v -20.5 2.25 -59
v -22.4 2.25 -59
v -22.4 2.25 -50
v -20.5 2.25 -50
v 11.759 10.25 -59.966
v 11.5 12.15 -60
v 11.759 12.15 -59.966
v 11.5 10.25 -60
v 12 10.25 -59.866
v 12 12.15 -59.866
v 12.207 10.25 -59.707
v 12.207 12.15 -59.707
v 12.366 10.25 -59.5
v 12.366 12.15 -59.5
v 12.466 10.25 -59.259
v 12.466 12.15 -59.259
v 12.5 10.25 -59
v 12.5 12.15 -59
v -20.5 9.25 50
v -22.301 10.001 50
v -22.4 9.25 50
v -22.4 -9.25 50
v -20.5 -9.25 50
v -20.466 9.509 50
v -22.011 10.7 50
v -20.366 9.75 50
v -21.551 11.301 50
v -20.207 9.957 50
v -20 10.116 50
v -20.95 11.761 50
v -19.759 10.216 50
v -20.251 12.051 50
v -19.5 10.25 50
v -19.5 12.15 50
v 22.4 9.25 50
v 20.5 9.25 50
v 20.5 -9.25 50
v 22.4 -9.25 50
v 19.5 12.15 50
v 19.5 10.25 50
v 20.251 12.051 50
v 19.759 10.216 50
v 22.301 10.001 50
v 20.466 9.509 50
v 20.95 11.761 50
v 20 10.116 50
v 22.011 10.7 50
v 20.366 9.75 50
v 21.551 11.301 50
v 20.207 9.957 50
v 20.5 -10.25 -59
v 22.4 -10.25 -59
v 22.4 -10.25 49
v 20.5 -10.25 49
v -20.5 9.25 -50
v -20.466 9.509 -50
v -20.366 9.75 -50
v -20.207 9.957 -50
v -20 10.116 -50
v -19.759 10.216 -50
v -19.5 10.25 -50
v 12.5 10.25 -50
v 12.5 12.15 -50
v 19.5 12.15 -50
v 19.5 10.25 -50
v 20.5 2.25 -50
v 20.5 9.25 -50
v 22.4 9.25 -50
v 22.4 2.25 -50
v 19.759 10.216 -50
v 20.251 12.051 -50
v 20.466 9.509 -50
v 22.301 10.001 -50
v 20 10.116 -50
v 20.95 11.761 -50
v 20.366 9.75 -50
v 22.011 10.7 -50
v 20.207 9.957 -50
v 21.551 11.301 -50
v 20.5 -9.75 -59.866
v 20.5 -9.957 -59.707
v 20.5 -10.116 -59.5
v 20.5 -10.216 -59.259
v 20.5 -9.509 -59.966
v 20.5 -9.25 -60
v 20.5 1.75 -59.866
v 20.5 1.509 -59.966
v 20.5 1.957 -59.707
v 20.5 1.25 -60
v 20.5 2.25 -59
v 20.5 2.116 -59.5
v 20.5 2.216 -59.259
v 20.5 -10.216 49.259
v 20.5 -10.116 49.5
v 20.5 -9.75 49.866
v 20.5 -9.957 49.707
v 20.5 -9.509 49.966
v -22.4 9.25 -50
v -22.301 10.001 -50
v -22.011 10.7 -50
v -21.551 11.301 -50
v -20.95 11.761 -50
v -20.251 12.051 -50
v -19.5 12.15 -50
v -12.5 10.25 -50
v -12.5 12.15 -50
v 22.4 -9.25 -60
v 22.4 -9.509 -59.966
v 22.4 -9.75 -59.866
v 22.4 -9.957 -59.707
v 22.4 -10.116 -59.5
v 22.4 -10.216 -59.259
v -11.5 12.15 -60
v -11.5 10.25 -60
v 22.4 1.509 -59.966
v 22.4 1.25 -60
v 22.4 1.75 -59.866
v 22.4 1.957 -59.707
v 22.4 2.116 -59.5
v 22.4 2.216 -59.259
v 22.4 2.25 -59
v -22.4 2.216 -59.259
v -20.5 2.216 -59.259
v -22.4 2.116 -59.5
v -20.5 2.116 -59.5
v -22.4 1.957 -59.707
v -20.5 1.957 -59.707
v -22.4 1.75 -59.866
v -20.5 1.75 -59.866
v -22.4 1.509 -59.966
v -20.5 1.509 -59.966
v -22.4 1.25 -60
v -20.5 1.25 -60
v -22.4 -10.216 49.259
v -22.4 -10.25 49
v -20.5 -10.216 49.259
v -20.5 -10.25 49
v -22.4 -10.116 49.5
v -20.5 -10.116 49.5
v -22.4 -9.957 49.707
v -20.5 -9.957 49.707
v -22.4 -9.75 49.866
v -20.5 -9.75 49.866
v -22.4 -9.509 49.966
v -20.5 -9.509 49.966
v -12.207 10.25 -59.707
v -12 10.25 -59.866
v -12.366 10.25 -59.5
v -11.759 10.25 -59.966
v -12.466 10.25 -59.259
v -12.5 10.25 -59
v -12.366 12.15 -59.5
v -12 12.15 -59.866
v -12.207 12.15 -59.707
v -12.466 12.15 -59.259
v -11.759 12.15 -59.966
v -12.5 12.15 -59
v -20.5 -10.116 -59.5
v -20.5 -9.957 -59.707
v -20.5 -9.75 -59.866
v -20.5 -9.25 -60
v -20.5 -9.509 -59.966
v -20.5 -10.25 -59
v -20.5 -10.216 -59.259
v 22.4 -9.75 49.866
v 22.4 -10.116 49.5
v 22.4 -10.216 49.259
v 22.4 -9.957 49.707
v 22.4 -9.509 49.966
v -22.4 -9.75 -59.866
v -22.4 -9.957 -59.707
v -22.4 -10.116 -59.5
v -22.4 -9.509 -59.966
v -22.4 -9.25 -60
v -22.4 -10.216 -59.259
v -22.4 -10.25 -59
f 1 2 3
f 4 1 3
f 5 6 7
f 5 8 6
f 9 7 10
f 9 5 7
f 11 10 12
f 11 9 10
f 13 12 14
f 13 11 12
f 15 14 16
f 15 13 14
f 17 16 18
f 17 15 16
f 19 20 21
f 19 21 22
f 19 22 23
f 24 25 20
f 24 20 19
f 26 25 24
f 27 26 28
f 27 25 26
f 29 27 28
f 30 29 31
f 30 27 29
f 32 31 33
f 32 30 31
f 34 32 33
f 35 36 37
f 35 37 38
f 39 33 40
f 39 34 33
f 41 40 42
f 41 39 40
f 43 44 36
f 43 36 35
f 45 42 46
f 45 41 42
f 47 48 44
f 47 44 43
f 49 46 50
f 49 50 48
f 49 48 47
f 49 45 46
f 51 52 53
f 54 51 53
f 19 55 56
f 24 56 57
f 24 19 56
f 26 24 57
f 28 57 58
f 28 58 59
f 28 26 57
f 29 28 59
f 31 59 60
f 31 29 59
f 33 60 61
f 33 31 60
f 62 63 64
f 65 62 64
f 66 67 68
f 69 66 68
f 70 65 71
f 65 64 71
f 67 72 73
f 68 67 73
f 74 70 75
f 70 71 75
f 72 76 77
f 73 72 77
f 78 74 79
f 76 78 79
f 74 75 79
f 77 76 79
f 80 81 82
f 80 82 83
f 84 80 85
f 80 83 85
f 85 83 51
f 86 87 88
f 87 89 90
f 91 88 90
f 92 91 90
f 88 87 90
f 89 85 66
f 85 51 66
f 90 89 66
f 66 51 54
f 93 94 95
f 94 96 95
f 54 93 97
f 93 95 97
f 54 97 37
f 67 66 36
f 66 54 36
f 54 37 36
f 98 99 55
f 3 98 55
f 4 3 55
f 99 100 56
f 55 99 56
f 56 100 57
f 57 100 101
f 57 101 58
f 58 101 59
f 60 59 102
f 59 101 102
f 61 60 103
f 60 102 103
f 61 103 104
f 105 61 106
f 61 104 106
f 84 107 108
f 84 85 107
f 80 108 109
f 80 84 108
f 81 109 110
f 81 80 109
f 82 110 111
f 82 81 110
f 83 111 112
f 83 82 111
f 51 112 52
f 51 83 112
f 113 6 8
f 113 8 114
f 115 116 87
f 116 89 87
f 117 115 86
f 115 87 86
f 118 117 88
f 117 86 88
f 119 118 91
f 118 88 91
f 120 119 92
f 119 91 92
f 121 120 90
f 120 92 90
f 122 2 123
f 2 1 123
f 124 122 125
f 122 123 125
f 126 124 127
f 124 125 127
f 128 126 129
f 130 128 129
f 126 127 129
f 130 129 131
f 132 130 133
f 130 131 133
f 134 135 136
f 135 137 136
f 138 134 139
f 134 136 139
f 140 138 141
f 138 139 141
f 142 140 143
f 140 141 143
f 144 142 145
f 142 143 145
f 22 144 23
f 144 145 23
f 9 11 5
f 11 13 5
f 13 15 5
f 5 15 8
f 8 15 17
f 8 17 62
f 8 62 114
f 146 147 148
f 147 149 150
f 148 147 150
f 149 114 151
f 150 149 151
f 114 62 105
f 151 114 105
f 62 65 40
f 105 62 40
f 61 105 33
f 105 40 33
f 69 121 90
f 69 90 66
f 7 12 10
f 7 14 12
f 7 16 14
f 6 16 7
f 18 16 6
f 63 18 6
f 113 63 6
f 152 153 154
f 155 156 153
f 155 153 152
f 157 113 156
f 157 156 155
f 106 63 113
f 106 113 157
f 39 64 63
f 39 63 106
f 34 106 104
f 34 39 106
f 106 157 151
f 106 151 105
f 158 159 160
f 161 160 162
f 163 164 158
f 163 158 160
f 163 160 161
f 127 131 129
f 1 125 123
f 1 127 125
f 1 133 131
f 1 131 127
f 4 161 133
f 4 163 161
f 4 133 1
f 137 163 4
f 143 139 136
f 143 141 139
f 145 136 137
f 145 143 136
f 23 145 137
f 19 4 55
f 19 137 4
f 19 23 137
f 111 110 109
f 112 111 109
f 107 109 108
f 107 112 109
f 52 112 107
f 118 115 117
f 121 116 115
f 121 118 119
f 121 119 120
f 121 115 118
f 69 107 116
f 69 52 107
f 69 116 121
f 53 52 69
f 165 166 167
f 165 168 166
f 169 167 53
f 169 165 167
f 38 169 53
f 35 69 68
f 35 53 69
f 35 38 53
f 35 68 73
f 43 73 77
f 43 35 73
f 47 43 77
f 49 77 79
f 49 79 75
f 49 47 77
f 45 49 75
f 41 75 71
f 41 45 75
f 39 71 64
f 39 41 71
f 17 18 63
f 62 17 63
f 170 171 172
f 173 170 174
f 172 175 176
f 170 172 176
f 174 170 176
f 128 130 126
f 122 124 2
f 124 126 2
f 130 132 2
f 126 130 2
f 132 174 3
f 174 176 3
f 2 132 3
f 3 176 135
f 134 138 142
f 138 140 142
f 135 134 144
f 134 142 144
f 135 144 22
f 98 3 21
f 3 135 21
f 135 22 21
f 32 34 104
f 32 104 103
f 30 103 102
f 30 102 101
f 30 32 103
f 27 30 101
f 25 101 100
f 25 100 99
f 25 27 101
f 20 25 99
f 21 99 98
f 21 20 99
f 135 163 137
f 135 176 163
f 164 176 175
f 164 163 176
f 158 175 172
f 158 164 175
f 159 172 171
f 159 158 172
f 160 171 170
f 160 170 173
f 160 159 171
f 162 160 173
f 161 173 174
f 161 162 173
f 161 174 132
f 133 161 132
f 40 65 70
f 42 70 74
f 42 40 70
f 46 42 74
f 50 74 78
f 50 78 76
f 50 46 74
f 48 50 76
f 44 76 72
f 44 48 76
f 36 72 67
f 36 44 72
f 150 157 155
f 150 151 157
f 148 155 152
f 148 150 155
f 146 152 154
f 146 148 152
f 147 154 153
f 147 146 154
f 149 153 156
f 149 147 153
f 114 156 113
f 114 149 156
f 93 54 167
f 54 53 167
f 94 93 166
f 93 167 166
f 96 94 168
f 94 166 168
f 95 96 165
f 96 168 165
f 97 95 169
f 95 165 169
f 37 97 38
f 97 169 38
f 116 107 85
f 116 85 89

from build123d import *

# Parameters (mm, degrees)
F1_DEPTH = 50
F2_W     = 25
F2_H     = 20
F3_DEPTH = 1.9
F4_W     = 12.5
F4_H     = 10
F5_DEPTH = 1.9
F7_R     = 1


with BuildPart() as f1:
    # F0 (on Top) → F1 (new body, symmetric)
    with BuildSketch(Plane.XY):
        with BuildLine():
            Line((-19.5, 10.25), (19.5, 10.25))
            ThreePointArc((19.5, 10.25), (20.2071067812, 9.9571067812), (20.5, 9.25))
            Line((20.5, 9.25), (20.5, -10.25))
            Line((20.5, -10.25), (22.4, -10.25))
            Line((22.4, -10.25), (22.4, 9.25))
            ThreePointArc((22.4, 9.25), (21.5506096654, 11.3006096654), (19.5, 12.15))
            Line((19.5, 12.15), (-19.5, 12.15))
            ThreePointArc((-19.5, 12.15), (-21.5506096654, 11.3006096654), (-22.4, 9.25))
            Line((-22.4, 9.25), (-22.4, -10.25))
            Line((-22.4, -10.25), (-20.5, -10.25))
            Line((-20.5, -10.25), (-20.5, 9.25))
            ThreePointArc((-20.5, 9.25), (-20.2071067812, 9.9571067812), (-19.5, 10.25))
        make_face()
    extrude(amount=F1_DEPTH, both=True)

    # F2 (on face) → F3 (join, through all)
    with BuildSketch(Plane(origin=(0, 12.15, 0), x_dir=(-1, 0, 0), z_dir=(0, 1, 0))):
        with Locations((0, -50)):
            Rectangle(F2_W, F2_H)
    extrude(amount=-F3_DEPTH)

    # F4 (on face) → F5 (join, through all)
    with BuildSketch(Plane.YZ.offset(22.4)):
        with Locations((-4, -55)):
            Rectangle(F4_W, F4_H)
    extrude(amount=-F5_DEPTH)

    # F6: F1 across plane


with BuildPart() as f1_1:
    add(f1.part)
    add(f1.part.mirror(Plane.YZ))

    # F7
    f7_edges = [f1_1.edges().sort_by_distance(p)[0] for p in [
        (21.45, -10.25, 50),
        (-21.45, -10.25, 50),
        (12.5, 11.2, -60),
        (-12.5, 11.2, -60),
        (21.45, 2.25, -60),
        (-21.45, 2.25, -60),
        (21.45, -10.25, -60),
        (-21.45, -10.25, -60),
    ]]
    fillet(f7_edges, radius=F7_R)


solid = f1_1.part
